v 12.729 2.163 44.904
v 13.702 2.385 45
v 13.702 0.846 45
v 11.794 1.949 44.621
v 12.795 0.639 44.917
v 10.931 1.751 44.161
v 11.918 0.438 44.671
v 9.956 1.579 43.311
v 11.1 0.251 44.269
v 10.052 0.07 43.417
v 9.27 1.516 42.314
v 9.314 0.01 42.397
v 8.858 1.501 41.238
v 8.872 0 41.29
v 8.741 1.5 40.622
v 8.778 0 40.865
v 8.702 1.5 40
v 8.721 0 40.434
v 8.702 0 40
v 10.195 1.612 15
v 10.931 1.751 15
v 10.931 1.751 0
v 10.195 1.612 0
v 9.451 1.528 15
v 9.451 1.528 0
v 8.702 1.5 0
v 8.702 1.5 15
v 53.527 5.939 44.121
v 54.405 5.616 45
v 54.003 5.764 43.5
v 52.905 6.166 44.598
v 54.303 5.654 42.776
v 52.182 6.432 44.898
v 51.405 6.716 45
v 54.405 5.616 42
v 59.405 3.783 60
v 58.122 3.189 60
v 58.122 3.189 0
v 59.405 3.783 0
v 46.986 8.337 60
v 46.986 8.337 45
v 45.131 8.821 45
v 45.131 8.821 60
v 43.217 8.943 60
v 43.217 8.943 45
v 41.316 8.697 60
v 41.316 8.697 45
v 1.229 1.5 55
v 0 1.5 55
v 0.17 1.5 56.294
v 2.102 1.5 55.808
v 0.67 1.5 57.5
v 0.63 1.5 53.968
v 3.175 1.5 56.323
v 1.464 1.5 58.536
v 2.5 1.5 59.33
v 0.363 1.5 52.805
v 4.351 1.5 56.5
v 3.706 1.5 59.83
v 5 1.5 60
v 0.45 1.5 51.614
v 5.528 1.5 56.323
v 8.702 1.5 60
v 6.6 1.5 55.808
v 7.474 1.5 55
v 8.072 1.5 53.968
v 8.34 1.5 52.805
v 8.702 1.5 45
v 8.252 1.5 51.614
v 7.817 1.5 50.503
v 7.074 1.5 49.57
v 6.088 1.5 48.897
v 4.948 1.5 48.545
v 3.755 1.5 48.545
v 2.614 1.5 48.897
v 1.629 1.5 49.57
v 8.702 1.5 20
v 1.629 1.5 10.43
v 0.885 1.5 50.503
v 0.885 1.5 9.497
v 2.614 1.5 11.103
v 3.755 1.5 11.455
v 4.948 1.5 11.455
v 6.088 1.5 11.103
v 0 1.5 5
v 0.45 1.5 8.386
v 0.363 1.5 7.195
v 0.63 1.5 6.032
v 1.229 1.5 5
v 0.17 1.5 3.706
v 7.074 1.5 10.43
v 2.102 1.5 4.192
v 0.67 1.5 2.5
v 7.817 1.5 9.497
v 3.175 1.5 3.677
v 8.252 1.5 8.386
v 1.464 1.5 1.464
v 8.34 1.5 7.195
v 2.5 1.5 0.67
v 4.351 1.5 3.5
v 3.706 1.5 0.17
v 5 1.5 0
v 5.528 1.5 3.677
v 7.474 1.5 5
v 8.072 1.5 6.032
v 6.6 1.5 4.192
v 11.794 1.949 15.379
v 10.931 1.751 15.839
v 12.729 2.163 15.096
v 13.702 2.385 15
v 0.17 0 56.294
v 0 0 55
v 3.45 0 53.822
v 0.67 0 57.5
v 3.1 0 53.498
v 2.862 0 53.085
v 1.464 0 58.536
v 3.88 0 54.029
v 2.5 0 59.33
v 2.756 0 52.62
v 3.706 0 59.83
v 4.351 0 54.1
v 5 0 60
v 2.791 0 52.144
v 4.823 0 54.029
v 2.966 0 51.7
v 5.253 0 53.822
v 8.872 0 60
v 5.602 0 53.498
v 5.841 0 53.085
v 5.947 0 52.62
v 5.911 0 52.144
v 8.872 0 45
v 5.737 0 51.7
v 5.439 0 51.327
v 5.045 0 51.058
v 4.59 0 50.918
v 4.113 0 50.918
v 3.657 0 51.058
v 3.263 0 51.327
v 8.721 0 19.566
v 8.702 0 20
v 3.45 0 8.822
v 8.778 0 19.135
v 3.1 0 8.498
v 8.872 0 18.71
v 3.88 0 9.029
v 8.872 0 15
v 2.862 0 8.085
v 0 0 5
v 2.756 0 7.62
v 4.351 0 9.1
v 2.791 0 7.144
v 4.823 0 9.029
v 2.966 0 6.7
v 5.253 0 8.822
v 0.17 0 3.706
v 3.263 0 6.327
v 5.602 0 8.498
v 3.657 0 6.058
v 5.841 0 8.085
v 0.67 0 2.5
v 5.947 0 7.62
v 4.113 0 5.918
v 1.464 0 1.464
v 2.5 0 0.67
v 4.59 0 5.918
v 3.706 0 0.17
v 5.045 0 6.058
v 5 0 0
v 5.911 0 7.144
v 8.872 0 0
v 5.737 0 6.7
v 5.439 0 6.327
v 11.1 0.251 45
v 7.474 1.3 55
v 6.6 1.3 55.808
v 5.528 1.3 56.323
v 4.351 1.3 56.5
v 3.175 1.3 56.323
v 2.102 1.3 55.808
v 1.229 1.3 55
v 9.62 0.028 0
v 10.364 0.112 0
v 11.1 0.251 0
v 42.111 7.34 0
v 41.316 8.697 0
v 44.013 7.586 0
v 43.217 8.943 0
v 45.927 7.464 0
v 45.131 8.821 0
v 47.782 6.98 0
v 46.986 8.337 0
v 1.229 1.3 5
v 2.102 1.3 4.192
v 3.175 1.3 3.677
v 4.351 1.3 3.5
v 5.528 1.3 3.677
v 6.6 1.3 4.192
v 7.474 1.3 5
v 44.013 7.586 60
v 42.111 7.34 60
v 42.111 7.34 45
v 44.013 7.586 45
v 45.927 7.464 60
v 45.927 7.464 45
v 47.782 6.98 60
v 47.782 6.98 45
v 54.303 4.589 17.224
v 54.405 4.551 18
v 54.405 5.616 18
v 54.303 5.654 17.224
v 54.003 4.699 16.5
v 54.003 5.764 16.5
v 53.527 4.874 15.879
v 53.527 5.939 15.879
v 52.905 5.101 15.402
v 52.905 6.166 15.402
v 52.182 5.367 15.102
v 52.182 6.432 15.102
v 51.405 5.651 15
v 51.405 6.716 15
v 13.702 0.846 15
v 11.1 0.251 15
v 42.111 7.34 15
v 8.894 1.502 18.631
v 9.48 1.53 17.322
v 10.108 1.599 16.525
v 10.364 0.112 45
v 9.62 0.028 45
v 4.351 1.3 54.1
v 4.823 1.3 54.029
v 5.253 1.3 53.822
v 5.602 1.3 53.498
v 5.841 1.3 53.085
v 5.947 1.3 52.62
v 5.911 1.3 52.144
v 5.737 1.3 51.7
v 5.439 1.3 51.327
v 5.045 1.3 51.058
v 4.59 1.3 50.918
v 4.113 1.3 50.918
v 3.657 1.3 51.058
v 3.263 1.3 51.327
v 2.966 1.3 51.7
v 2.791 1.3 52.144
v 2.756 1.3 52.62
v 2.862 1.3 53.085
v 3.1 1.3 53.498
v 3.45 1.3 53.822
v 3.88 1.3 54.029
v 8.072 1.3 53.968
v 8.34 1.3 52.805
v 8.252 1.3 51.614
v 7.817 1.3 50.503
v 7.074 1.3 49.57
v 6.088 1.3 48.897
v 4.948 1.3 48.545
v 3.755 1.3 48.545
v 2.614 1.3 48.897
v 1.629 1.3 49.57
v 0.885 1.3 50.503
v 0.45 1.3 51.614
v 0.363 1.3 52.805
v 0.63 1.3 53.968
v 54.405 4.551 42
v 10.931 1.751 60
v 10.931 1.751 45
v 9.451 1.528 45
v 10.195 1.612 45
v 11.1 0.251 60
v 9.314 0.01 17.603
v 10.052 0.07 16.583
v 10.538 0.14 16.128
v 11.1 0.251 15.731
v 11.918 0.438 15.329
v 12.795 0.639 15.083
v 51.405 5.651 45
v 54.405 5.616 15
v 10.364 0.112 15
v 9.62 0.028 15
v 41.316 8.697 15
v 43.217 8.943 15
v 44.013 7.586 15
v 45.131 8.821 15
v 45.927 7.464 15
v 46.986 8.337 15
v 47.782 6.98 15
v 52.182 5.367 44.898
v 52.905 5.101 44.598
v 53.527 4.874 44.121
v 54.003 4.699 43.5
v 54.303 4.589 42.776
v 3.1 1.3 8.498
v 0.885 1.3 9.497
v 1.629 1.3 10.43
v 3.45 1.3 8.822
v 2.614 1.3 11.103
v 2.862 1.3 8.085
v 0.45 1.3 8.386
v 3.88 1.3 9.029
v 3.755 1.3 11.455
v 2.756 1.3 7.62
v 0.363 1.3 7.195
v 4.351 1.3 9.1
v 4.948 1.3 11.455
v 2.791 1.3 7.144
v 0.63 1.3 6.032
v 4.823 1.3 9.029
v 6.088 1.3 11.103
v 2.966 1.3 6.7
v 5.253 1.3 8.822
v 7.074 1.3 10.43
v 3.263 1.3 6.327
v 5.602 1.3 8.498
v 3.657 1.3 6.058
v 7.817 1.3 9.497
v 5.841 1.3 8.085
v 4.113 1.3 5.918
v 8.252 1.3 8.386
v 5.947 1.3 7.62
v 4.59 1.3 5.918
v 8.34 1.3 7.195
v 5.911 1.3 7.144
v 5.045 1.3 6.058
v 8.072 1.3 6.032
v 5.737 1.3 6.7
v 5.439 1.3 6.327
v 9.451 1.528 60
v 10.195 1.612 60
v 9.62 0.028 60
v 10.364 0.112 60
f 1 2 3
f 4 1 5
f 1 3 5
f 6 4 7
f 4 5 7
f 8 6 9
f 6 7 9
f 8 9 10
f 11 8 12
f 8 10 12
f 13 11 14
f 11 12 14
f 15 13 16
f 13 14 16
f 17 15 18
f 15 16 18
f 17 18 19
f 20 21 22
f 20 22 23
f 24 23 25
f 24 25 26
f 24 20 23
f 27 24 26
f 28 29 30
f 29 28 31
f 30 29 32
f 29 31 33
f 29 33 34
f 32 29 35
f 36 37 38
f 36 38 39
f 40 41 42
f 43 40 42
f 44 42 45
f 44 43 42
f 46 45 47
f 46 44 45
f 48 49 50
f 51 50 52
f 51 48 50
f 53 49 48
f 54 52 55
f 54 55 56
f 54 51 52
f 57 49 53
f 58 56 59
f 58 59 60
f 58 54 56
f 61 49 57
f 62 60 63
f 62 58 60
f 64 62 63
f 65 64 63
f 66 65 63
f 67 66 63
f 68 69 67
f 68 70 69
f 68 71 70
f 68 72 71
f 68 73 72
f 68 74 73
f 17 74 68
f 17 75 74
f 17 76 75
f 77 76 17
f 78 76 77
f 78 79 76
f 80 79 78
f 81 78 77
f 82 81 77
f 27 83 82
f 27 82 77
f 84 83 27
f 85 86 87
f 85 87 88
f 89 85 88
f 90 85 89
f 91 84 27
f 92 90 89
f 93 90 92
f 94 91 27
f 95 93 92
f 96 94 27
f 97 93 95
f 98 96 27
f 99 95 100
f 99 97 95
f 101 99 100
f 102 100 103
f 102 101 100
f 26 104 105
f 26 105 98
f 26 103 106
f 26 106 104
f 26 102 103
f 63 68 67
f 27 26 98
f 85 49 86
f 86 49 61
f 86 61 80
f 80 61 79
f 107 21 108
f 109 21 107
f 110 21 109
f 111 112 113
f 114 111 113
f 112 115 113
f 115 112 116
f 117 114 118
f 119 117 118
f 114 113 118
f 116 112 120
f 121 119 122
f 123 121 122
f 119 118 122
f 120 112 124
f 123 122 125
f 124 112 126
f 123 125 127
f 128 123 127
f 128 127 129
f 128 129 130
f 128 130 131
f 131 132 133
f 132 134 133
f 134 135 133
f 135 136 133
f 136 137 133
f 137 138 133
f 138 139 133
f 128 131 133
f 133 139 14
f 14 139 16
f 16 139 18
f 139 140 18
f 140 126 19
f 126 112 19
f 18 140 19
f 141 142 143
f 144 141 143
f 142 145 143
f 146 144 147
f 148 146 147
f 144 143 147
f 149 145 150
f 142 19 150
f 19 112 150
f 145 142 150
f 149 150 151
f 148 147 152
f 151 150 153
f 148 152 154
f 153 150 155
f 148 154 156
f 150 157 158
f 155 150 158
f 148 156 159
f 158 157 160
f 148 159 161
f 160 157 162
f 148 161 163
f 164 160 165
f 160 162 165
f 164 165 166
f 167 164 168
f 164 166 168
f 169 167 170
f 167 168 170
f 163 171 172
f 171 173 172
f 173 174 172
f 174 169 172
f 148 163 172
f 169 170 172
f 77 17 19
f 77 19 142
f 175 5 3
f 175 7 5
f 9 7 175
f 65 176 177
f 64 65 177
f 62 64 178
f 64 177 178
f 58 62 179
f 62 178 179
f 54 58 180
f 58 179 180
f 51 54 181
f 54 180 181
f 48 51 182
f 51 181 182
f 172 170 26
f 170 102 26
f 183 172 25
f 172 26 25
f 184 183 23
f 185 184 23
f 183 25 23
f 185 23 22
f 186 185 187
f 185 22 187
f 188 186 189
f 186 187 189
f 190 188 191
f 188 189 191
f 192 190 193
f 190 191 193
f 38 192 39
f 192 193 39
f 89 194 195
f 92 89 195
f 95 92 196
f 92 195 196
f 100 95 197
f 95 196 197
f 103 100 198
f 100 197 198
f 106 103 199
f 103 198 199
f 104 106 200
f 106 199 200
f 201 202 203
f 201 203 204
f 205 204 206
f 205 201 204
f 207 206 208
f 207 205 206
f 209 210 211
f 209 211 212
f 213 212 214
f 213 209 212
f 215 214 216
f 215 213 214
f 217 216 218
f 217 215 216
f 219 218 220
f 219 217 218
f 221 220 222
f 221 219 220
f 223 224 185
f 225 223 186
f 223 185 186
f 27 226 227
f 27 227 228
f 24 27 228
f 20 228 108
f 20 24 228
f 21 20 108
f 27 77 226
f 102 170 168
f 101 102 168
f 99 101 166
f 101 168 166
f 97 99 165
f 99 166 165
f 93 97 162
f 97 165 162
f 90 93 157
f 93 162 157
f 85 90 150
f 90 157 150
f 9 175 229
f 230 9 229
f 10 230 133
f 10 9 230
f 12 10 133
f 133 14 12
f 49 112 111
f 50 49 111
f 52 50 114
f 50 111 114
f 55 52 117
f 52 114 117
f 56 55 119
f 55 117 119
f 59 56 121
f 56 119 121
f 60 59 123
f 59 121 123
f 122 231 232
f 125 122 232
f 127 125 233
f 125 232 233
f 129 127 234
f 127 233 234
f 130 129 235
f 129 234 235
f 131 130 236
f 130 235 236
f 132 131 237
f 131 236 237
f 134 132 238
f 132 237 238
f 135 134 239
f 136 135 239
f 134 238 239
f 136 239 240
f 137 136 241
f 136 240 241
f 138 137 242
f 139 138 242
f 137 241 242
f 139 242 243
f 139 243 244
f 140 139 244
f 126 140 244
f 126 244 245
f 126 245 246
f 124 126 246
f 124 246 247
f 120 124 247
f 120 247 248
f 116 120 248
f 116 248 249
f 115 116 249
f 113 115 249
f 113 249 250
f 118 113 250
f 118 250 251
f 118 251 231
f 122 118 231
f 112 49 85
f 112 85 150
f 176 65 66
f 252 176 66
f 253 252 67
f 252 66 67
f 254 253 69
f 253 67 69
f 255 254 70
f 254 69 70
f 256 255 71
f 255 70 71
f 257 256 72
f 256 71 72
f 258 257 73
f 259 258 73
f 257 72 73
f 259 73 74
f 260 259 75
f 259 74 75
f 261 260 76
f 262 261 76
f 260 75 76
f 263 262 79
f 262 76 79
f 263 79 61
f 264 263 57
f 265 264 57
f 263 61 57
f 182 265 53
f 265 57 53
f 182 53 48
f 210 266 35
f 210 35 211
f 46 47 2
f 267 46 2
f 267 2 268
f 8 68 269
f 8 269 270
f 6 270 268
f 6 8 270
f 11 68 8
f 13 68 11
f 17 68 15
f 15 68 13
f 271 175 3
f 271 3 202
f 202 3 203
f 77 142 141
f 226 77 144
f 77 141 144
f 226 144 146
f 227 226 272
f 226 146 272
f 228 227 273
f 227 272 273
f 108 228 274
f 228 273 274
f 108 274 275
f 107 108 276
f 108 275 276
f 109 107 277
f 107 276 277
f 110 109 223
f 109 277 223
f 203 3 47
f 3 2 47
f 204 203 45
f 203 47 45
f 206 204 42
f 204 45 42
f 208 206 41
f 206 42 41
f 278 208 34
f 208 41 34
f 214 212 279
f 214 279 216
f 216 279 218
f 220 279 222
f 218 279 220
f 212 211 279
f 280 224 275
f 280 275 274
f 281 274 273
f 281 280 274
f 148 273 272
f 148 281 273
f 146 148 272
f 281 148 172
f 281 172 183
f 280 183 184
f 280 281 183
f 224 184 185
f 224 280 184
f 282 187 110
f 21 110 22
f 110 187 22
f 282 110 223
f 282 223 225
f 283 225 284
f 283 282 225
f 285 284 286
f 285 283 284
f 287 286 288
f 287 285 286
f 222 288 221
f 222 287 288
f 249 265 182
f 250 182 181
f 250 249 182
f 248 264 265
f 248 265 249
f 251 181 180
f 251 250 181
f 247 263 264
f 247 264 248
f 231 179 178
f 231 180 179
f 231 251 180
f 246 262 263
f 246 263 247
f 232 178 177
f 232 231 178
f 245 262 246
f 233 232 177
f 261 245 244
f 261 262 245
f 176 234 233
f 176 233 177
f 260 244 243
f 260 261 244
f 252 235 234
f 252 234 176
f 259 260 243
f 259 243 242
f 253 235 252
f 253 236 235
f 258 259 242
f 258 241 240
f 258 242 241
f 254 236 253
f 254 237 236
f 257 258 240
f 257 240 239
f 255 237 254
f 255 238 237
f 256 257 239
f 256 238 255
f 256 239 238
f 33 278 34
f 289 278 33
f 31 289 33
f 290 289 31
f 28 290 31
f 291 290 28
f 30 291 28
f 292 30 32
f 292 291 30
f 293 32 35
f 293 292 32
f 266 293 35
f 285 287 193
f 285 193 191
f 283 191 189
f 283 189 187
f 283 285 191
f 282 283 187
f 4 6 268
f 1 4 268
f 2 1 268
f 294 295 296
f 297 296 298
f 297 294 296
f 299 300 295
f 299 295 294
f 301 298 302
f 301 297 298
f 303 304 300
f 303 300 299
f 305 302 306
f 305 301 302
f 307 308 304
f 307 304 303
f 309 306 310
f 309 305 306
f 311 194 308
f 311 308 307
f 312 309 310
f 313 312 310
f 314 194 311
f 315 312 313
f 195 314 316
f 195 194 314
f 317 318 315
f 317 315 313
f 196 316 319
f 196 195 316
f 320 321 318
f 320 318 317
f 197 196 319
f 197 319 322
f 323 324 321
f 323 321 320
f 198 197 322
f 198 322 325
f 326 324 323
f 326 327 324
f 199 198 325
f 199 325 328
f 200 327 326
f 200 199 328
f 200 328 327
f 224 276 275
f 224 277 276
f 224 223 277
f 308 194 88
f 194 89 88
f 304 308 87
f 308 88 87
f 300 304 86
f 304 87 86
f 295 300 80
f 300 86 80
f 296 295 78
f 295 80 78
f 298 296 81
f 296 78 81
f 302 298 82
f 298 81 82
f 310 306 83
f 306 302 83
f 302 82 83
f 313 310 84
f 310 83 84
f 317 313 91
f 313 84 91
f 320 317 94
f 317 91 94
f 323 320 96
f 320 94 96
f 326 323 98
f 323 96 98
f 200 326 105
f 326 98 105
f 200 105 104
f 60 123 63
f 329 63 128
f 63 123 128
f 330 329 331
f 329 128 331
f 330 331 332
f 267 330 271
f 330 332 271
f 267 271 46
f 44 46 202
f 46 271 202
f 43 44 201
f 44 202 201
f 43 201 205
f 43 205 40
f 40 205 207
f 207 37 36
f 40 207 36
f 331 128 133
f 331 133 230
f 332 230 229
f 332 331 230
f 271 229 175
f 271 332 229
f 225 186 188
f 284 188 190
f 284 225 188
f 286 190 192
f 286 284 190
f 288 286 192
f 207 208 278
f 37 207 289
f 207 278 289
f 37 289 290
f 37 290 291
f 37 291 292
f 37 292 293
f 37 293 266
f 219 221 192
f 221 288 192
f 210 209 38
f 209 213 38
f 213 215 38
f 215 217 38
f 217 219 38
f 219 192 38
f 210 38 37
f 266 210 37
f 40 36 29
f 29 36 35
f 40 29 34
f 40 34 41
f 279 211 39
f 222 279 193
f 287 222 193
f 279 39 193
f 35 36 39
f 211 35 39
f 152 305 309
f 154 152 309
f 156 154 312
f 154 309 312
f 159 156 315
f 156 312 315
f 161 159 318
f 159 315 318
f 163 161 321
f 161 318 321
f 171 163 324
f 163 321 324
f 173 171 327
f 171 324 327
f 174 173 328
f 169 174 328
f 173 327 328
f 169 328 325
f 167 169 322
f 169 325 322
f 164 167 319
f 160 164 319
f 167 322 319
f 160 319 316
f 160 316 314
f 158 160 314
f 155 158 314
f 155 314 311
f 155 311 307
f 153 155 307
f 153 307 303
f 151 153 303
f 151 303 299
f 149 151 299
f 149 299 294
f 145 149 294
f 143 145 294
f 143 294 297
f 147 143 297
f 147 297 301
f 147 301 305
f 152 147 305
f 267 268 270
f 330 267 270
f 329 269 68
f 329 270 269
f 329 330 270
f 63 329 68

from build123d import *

# Parameters (mm, degrees)
EXTRUDE_1_DEPTH                 = 60
FILLET_1_R                      = 10
CHAMFER_1_SIZE                  = 2
CHAMFER_1_SIZE_2                = 1.558687347
CUT_EXTRUDE_1_REACH             = 86.761
SKETCH_2_R                      = 1.6
SKETCH_3_R                      = 4
CUT_EXTRUDE_2_DEPTH             = 0.2
CUT_EXTRUDE_3_REACH             = 86.761
SKETCH_4_W                      = 45.702932162
SKETCH_4_H                      = 30
CUT_EXTRUDE_3_DIRECTION_2_REACH = 86.761
FILLET_2_OUTLINE_W              = 8.702446171
FILLET_2_OUTLINE_H              = 1.5
FILLET_2_DEPTH                  = 5
FILLET_START                    = 55
FILLET_2_2_OUTLINE_W            = 8.702446171
FILLET_2_2_OUTLINE_H            = 1.5
FILLET_2_2_DEPTH                = 5
FILLET_2_3_DEPTH                = 1.3
FILLET_START_2                  = 1.3
FILLET_2_4_DEPTH                = 0.2
FILLET_START_3                  = 1.478876
FILLET_2_5_DEPTH                = 0.906082345
FILLET_START_4                  = 15
FILLET_2_6_DEPTH                = 30
FILLET_3_R                      = 3


with BuildPart() as part:
    # 草图1 → 凸台-拉伸1 (new body)
    with BuildSketch(Plane.XY):
        Polygon((0, 0), (10, 0), (45, 8), (60, 2.5), (60, 3.565103021), (44.204382552, 9.356829418), (9.830753848, 1.5), (0, 1.5), align=None)
    extrude(amount=EXTRUDE_1_DEPTH)

    # 圆角1
    fillet_1_edges = [part.edges().sort_by_distance(p)[0] for p in [
        (9.830753848, 1.5, 30),
        (44.204382552, 9.356829418, 30),
        (45, 8, 30),
        (10, 0, 30),
    ]]
    fillet(fillet_1_edges, radius=FILLET_1_R)

    # 倒角1
    # the kernel refuses this chamfer: 2, 1.558687347 mm, written as the material it takes off along each edge
    with BuildSketch(Plane(origin=(60, 2.5, -5.143365976), x_dir=(-0.9388763158866087, 0.3442546491584233, 0), z_dir=(0, 0, 1))) as chamfer_1_piece_1:
        Polygon((CHAMFER_1_SIZE, 0), (CHAMFER_1_SIZE_2 * 0.3442546492, -CHAMFER_1_SIZE_2 * 0.938876315999), (0, 0), align=None)
    extrude(amount=70.286731952, mode=Mode.SUBTRACT)

    # 草图2 → 切除-拉伸1 (cut, up to next)
    with BuildSketch(Plane(origin=(0, 1.5, 0), x_dir=(1, 0, 0), z_dir=(0, 1, 0)), mode=Mode.PRIVATE) as cut_extrude_1_sk1:
        with Locations(Location((4.351223085, -7.5, 0), (0, 0, 270))):
            Circle(SKETCH_2_R)
    cut_extrude_1_tool1 = extrude(cut_extrude_1_sk1.sketch, amount=-CUT_EXTRUDE_1_REACH, mode=Mode.PRIVATE) & part.part
    # 草图2 → 切除-拉伸1 (cut, up to next)
    with BuildSketch(Plane(origin=(0, 1.5, 0), x_dir=(1, 0, 0), z_dir=(0, 1, 0)), mode=Mode.PRIVATE) as cut_extrude_1_sk2:
        with Locations(Location((4.351223085, -52.5, 0), (0, 0, 270))):
            Circle(SKETCH_2_R)
    cut_extrude_1_tool2 = extrude(cut_extrude_1_sk2.sketch, amount=-CUT_EXTRUDE_1_REACH, mode=Mode.PRIVATE) & part.part
    add(cut_extrude_1_tool1.solids().sort_by_distance((4.351223, 1.5, 7.5))[0], mode=Mode.SUBTRACT)
    add(cut_extrude_1_tool2.solids().sort_by_distance((4.351223, 1.5, 52.5))[0], mode=Mode.SUBTRACT)

    # 草图3 → 切除-拉伸2 (cut)
    with BuildSketch(Plane(origin=(0, 1.5, 0), x_dir=(1, 0, 0), z_dir=(0, 1, 0))):
        with Locations(Location((4.351223085, -7.5, 0), (0, 0, 270))):
            Circle(SKETCH_3_R)
        with Locations(Location((4.351223085, -52.5, 0), (0, 0, 270))):
            Circle(SKETCH_3_R)
    extrude(amount=-CUT_EXTRUDE_2_DEPTH, mode=Mode.SUBTRACT)

    # 草图4 → 切除-拉伸3 (cut, up to next)
    with BuildSketch(Plane(origin=(0, 1.5, 0), x_dir=(1, 0, 0), z_dir=(0, 1, 0)), mode=Mode.PRIVATE) as cut_extrude_3_sk1:
        with Locations((31.553912252, -30)):
            Rectangle(SKETCH_4_W, SKETCH_4_H)
    cut_extrude_3_tool1 = extrude(cut_extrude_3_sk1.sketch, amount=-CUT_EXTRUDE_3_REACH, mode=Mode.PRIVATE) & part.part
    add(cut_extrude_3_tool1.solids().sort_by_distance((31.553912, 1.5, 30))[0], mode=Mode.SUBTRACT)

    # 草图4 → 切除-拉伸3 direction 2 (cut, up to next)
    with BuildSketch(Plane(origin=(0, 1.5, 0), x_dir=(1, 0, 0), z_dir=(0, 1, 0)), mode=Mode.PRIVATE) as cut_extrude_3_direction_2_sk1:
        with Locations((31.553912252, -30)):
            Rectangle(SKETCH_4_W, SKETCH_4_H)
    cut_extrude_3_direction_2_tool1 = extrude(cut_extrude_3_direction_2_sk1.sketch, amount=CUT_EXTRUDE_3_DIRECTION_2_REACH, mode=Mode.PRIVATE) & part.part
    add(cut_extrude_3_direction_2_tool1.solids().sort_by_distance((31.553912, 1.5, 30))[0], mode=Mode.SUBTRACT)

    # 圆角2: read off the stored shape, not the designer's step
    # 圆角2 outline → 圆角2 (cut)
    with BuildSketch(Plane.XY):
        with Locations((4.351223086, 0.75)):
            Rectangle(FILLET_2_OUTLINE_W, FILLET_2_OUTLINE_H)
    extrude(amount=FILLET_2_DEPTH, mode=Mode.SUBTRACT)

    # Fillet 2 2 outline → Fillet 2 2 (cut)
    with BuildSketch(Plane.XY.offset(FILLET_START)):
        with Locations((4.351223086, 0.75)):
            Rectangle(FILLET_2_2_OUTLINE_W, FILLET_2_2_OUTLINE_H)
    extrude(amount=FILLET_2_2_DEPTH, mode=Mode.SUBTRACT)

    # Fillet 2 3 outline → Fillet 2 3 (add)
    with BuildSketch(Plane(origin=(0, 0, 0), x_dir=(1, 0, 0), z_dir=(0, 1, 0))):
        with BuildLine():
            Line((5, -60), (8.702446171, -60))
            Line((8.702446171, -60), (8.702446171, -55))
            Line((8.702446171, -55), (0, -55))
            ThreePointArc((0, -55), (1.464466094, -58.535533906), (5, -60))
        make_face()
        with BuildLine():
            Line((8.702446171, -5), (8.702446171, 0))
            Line((8.702446171, 0), (5, 0))
            ThreePointArc((5, 0), (1.464466094, -1.464466094), (0, -5))
            Line((0, -5), (8.702446171, -5))
        make_face()
        with BuildLine():
            ThreePointArc((13.702446171, -45), (10.166912265, -43.535533906), (8.702446171, -40))
            Line((8.702446171, -40), (8.702446171, -45))
            Line((8.702446171, -45), (13.702446171, -45))
        make_face()
        with BuildLine():
            ThreePointArc((8.702446171, -20), (10.166912265, -16.464466094), (13.702446171, -15))
            Line((13.702446171, -15), (8.702446171, -15))
            Line((8.702446171, -15), (8.702446171, -20))
        make_face()
    extrude(amount=FILLET_2_3_DEPTH)

    # Fillet 2 4 outline → Fillet 2 4 (add)
    with BuildSketch(Plane(origin=(0, 0, 0), x_dir=(1, 0, 0), z_dir=(0, 1, 0)).offset(FILLET_START_2)):
        with BuildLine():
            Line((5, -60), (8.702446171, -60))
            Line((8.702446171, -60), (8.702446171, -55))
            Line((8.702446171, -55), (7.473722084, -55))
            ThreePointArc((7.473722084, -55), (4.351223085, -56.5), (1.228724086, -55))
            Line((1.228724086, -55), (0, -55))
            ThreePointArc((0, -55), (1.464466094, -58.535533906), (5, -60))
        make_face()
        with BuildLine():
            Line((8.702446171, -5), (8.702446171, 0))
            Line((8.702446171, 0), (5, 0))
            ThreePointArc((5, 0), (1.464466094, -1.464466094), (0, -5))
            Line((0, -5), (1.228724086, -5))
            ThreePointArc((1.228724086, -5), (4.351223085, -3.5), (7.473722084, -5))
            Line((7.473722084, -5), (8.702446171, -5))
        make_face()
        with BuildLine():
            ThreePointArc((13.702446171, -45), (10.166912265, -43.535533906), (8.702446171, -40))
            Line((8.702446171, -40), (8.702446171, -45))
            Line((8.702446171, -45), (13.702446171, -45))
        make_face()
        with BuildLine():
            ThreePointArc((8.702446171, -20), (10.166912265, -16.464466094), (13.702446171, -15))
            Line((13.702446171, -15), (8.702446171, -15))
            Line((8.702446171, -15), (8.702446171, -20))
        make_face()
    extrude(amount=FILLET_2_4_DEPTH)

    # Fillet 2 5 outline → Fillet 2 5 (add)
    with BuildSketch(Plane(origin=(0, 0, 0), x_dir=(1, 0, 0), z_dir=(0, 1, 0)).offset(FILLET_START_3)):
        with BuildLine():
            ThreePointArc((13.702446171, -45), (10.166912265, -43.535533906), (8.702446171, -40))
            Line((8.702446171, -40), (8.702446171, -45))
            Line((8.702446171, -45), (13.702446171, -45))
        make_face()
        with BuildLine():
            ThreePointArc((8.702446171, -20), (10.166912265, -16.464466094), (13.702446171, -15))
            Line((13.702446171, -15), (8.702446171, -15))
            Line((8.702446171, -15), (8.702446171, -20))
        make_face()
    extrude(amount=FILLET_2_5_DEPTH)

    # Fillet 2 6 outline → Fillet 2 6 (cut)
    with BuildSketch(Plane.XY.offset(FILLET_START_4)):
        with BuildLine():
            Line((10.930694186, 1.751414934), (13.702446193, 2.38495825))
            Line((13.702446193, 2.38495825), (8.702446171, 2.384958345))
            Line((8.702446171, 2.384958345), (8.702446171, 1.5))
            ThreePointArc((8.702446171, 1.5), (9.823639585, 1.563052515), (10.930694186, 1.751414934))
        make_face()
        with BuildLine():
            Line((8.871692322, 0), (13.702446171, 0))
            Line((13.702446171, 0), (13.702446171, 0.846273411))
            Line((13.702446171, 0.846273411), (11.099940337, 0.251414934))
            ThreePointArc((11.099940337, 0.251414934), (9.992885736, 0.063052515), (8.871692322, 0))
        make_face()
    extrude(amount=FILLET_2_6_DEPTH, mode=Mode.SUBTRACT)

    # 圆角3
    # the kernel refuses this fillet: 3 mm, written as the material it adds along each edge
    with BuildSketch(Plane(origin=(54.405378333, -2.948638722, 45), x_dir=(-1, 0, 0), z_dir=(0, 1, 0))) as fillet_3_piece_1_section:
        with BuildLine():
            CenterArc((FILLET_3_R, -FILLET_3_R), FILLET_3_R, 90, 90)
            Line((0, -FILLET_3_R), (0, 0))
            Line((0, 0), (FILLET_3_R, 0))
        make_face()
    fillet_3_piece_1 = extrude(amount=16.065103021, mode=Mode.PRIVATE)
    fillet_3_piece_1 = split(fillet_3_piece_1, bisect_by=Plane(origin=(56.829472359, 3.662526802, 45), z_dir=(0.34425464915842324, 0.9388763158866087, 0)), keep=Keep.TOP, mode=Mode.PRIVATE)
    fillet_3_piece_1 = split(fillet_3_piece_1, bisect_by=Plane(origin=(57.173727008, 4.601403118, 45), z_dir=(-0.344254649158423, -0.9388763158866088, 0)), keep=Keep.TOP, mode=Mode.PRIVATE)
    add(fillet_3_piece_1)
    with BuildSketch(Plane(origin=(54.405378333, -2.948638722, 15), x_dir=(-1, 0, 0), z_dir=(0, 1, 0))) as fillet_3_piece_2_section:
        with BuildLine():
            CenterArc((FILLET_3_R, FILLET_3_R), FILLET_3_R, 180, 90)
            Line((0, FILLET_3_R), (0, 0))
            Line((0, 0), (FILLET_3_R, 0))
        make_face()
    fillet_3_piece_2 = extrude(amount=16.065103021, mode=Mode.PRIVATE)
    fillet_3_piece_2 = split(fillet_3_piece_2, bisect_by=Plane(origin=(57.173727008, 4.601403118, 15), z_dir=(-0.344254649158423, -0.9388763158866088, 0)), keep=Keep.TOP, mode=Mode.PRIVATE)
    fillet_3_piece_2 = split(fillet_3_piece_2, bisect_by=Plane(origin=(56.829472359, 3.662526802, 15), z_dir=(0.34425464915842324, 0.9388763158866087, 0)), keep=Keep.TOP, mode=Mode.PRIVATE)
    add(fillet_3_piece_2)


solid = part.part
